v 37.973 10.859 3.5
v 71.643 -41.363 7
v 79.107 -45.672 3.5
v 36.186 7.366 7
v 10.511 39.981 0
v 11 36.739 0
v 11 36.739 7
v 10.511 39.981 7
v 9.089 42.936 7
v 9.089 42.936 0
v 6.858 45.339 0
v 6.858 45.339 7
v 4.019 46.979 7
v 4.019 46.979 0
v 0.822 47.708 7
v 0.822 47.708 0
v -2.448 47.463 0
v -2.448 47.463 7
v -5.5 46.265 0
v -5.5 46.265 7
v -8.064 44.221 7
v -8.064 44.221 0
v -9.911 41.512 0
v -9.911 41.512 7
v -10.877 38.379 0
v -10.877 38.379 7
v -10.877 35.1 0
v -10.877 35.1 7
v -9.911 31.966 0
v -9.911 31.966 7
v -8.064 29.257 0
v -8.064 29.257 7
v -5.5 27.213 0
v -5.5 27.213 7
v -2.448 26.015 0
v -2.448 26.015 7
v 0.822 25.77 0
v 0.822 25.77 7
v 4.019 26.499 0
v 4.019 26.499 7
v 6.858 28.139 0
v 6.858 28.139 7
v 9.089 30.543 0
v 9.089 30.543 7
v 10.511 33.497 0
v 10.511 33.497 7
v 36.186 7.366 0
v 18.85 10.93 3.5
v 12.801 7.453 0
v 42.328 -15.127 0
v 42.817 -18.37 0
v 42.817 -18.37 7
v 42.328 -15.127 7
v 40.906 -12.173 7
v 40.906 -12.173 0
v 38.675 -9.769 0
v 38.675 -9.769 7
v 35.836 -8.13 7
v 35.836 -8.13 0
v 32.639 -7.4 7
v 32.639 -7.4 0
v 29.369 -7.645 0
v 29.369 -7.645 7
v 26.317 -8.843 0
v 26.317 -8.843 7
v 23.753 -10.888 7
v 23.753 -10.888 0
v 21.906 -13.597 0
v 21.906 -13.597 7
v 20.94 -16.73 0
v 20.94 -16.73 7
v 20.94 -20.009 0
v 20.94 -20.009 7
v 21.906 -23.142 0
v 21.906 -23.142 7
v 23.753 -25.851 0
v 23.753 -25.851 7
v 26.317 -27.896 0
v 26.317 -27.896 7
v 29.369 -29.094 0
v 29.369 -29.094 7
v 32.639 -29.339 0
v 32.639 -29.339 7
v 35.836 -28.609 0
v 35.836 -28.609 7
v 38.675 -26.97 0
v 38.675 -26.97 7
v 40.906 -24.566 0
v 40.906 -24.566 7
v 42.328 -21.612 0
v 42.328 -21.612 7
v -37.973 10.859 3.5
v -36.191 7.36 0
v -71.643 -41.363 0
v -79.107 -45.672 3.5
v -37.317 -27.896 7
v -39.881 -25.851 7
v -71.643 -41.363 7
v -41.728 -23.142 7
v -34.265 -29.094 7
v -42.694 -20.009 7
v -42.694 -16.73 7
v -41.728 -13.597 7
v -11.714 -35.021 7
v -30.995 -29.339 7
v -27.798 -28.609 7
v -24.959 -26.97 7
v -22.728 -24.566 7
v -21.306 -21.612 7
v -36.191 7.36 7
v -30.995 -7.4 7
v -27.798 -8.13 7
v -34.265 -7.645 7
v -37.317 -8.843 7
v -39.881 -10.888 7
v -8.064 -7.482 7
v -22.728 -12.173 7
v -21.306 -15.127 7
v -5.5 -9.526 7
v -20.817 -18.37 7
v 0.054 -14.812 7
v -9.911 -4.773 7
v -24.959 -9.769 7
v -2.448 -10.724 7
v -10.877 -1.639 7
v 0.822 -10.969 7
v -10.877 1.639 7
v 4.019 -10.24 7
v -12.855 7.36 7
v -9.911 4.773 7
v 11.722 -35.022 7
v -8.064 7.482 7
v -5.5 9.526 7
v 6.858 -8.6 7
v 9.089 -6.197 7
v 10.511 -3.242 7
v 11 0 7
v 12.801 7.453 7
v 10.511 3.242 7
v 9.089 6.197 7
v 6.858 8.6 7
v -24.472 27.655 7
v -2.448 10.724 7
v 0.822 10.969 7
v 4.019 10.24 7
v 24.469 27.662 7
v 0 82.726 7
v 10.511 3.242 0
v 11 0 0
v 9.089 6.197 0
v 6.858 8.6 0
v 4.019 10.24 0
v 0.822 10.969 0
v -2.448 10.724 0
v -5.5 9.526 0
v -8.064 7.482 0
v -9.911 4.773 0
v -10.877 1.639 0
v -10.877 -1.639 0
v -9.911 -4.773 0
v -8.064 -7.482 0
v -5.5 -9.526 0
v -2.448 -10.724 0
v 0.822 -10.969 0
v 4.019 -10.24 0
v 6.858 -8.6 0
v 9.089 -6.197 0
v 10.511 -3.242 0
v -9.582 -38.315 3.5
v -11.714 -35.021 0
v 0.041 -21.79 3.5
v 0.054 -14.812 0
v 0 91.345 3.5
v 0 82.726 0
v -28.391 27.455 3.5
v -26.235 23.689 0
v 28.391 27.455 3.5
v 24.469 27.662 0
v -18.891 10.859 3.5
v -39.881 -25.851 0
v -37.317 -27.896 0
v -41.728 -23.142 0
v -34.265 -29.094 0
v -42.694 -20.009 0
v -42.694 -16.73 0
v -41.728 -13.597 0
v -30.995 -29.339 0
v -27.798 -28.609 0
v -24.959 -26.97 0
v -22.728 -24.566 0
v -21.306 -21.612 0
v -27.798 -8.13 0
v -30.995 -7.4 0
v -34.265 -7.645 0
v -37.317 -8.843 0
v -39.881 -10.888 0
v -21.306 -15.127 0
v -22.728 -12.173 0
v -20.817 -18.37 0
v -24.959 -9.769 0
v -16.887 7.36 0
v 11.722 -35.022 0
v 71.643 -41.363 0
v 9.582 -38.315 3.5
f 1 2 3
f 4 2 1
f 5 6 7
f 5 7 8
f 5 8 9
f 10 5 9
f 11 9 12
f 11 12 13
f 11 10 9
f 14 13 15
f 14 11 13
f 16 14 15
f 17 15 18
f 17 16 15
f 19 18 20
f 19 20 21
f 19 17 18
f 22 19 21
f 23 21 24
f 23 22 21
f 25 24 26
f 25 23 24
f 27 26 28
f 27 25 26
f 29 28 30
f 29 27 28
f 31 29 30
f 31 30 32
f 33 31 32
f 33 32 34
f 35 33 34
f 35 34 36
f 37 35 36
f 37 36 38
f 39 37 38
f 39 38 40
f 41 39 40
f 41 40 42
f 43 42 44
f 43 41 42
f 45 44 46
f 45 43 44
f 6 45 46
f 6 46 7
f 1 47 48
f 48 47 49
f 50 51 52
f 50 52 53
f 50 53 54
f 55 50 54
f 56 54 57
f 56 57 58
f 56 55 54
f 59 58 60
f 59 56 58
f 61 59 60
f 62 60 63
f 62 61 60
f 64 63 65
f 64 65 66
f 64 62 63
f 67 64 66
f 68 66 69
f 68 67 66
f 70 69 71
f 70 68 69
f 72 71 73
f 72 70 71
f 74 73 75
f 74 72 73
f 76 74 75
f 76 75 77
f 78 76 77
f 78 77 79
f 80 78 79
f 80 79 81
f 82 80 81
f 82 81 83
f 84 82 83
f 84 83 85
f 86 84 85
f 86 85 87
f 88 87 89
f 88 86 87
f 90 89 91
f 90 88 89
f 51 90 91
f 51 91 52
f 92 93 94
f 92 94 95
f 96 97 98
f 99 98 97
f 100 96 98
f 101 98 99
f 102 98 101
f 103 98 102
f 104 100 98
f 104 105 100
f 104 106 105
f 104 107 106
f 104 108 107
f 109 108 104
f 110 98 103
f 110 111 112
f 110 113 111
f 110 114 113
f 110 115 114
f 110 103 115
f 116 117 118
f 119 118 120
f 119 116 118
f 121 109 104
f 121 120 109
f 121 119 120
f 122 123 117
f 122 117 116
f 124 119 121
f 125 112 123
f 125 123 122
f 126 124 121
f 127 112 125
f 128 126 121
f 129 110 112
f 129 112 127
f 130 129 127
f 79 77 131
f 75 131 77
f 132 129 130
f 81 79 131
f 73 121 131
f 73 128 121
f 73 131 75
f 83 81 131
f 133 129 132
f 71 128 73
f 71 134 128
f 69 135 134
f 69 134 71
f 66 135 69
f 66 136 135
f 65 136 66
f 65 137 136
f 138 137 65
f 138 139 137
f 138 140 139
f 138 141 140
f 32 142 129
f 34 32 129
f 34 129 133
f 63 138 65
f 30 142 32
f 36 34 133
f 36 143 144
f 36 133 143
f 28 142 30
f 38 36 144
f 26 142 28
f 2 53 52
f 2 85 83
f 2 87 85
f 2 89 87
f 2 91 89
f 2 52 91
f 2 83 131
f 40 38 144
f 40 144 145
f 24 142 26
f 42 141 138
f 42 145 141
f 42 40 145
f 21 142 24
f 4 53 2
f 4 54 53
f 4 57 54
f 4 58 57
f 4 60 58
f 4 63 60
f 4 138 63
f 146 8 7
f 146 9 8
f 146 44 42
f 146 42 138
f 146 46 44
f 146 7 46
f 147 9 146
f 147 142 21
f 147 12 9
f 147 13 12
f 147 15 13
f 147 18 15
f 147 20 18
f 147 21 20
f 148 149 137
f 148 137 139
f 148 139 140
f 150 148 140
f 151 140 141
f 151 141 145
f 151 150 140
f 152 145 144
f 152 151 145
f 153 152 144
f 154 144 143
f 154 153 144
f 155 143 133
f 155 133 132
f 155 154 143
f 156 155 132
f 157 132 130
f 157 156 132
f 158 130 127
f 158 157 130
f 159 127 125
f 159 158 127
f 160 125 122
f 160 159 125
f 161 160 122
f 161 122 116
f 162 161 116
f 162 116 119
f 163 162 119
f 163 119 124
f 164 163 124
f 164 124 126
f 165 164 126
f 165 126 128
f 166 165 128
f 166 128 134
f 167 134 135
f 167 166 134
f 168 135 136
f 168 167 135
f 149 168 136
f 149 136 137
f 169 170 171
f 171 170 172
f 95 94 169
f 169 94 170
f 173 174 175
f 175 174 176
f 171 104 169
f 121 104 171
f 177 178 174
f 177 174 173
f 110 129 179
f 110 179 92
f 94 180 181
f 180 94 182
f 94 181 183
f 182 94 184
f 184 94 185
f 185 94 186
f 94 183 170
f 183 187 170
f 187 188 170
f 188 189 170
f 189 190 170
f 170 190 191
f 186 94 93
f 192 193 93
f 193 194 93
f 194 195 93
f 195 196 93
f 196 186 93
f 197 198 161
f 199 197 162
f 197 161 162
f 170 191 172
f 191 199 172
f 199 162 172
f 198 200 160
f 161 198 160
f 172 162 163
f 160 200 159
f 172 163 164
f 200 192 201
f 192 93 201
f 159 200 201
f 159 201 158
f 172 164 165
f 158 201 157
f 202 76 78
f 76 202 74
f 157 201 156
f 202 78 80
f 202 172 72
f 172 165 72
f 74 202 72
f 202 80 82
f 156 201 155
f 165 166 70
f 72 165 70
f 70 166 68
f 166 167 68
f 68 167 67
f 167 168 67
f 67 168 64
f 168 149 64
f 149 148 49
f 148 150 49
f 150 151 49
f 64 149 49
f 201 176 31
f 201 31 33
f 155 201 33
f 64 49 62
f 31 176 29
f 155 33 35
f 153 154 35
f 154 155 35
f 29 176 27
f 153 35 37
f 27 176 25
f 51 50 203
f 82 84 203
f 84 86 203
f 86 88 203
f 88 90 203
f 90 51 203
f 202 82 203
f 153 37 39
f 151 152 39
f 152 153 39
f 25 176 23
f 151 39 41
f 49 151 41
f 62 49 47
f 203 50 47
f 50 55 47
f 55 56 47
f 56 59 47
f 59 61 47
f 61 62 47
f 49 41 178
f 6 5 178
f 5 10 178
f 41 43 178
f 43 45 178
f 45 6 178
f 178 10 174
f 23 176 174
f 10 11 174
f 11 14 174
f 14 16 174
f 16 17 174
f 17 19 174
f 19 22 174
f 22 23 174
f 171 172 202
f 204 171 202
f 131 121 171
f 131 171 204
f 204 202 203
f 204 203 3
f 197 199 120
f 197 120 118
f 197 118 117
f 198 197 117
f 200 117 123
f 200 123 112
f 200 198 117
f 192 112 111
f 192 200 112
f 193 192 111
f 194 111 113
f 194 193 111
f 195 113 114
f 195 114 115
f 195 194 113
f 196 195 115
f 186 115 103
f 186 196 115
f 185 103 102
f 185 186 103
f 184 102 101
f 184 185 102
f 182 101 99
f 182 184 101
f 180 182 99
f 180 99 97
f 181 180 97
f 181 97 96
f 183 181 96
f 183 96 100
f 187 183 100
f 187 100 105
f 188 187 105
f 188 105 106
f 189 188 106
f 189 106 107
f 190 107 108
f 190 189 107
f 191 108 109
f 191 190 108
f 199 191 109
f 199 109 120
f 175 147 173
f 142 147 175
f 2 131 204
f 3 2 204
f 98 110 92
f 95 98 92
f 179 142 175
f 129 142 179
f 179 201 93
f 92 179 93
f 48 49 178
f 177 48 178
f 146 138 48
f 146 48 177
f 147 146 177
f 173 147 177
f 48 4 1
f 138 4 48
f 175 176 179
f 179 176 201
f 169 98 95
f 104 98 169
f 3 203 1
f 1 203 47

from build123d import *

# Parameters (mm, degrees)
F0_R     = 11
F1_DEPTH = 7
F2_SIZE  = 3.49999


# Not quite as in the source:
# - a fillet or chamfer is up to 0.001 mm smaller than in the source, because OpenCascade refuses the exact size


with BuildPart() as f1:
    # F0 (on Top) → F1 (new body)
    with BuildSketch(Plane.XY):
        Polygon((28.3908957982, 27.4554844946), (0, 91.3447894481), (-28.3908957982, 27.4554844946), (-18.890943275, 10.8594947502), (-37.9725949446, 10.8594947502), (-79.1069081654, -45.6723947241), (-9.5816991464, -38.3149792447), (0.0408733116, -21.7897841527), (9.5816991464, -38.3149792447), (79.1069081654, -45.6723947241), (37.9725949446, 10.8594947502), (18.8500699634, 10.9302894025), align=None)
        with Locations((-31.8169734902, -18.3695382094)):
            Circle(F0_R, mode=Mode.SUBTRACT)
        with Locations((31.8169734902, -18.3695382094)):
            Circle(F0_R, mode=Mode.SUBTRACT)
        Circle(F0_R, mode=Mode.SUBTRACT)
        with Locations((0, 36.7390764187)):
            Circle(F0_R, mode=Mode.SUBTRACT)
    extrude(amount=F1_DEPTH)

    # F2 (size 3.5 in the source; OpenCascade refuses exactly that, so slightly less here)
    f2_edges = [f1.edges().sort_by_distance(p)[0] for p in [
        (-44.344304, -41.993687, 7),
        (-4.770413, -30.052382, 0),
        (-44.344304, -41.993687, 0),
        (-4.770413, -30.052382, 7),
        (4.811286, -30.052382, 7),
        (4.811286, -30.052382, 0),
        (44.344304, -41.993687, 7),
        (44.344304, -41.993687, 0),
        (-58.539752, -17.40645, 7),
        (58.539752, -17.40645, 7),
        (-14.195448, 59.400137, 7),
        (14.195448, 59.400137, 7),
        (-28.431769, 10.859495, 7),
        (-23.64092, 19.15749, 7),
        (23.620483, 19.192887, 0),
        (28.411332, 10.894892, 7),
        (23.620483, 19.192887, 7),
        (-28.431769, 10.859495, 0),
        (-58.539752, -17.40645, 0),
        (-14.195448, 59.400137, 0),
        (14.195448, 59.400137, 0),
        (58.539752, -17.40645, 0),
        (28.411332, 10.894892, 0),
    ]]
    chamfer(f2_edges, length=F2_SIZE)


solid = f1.part
